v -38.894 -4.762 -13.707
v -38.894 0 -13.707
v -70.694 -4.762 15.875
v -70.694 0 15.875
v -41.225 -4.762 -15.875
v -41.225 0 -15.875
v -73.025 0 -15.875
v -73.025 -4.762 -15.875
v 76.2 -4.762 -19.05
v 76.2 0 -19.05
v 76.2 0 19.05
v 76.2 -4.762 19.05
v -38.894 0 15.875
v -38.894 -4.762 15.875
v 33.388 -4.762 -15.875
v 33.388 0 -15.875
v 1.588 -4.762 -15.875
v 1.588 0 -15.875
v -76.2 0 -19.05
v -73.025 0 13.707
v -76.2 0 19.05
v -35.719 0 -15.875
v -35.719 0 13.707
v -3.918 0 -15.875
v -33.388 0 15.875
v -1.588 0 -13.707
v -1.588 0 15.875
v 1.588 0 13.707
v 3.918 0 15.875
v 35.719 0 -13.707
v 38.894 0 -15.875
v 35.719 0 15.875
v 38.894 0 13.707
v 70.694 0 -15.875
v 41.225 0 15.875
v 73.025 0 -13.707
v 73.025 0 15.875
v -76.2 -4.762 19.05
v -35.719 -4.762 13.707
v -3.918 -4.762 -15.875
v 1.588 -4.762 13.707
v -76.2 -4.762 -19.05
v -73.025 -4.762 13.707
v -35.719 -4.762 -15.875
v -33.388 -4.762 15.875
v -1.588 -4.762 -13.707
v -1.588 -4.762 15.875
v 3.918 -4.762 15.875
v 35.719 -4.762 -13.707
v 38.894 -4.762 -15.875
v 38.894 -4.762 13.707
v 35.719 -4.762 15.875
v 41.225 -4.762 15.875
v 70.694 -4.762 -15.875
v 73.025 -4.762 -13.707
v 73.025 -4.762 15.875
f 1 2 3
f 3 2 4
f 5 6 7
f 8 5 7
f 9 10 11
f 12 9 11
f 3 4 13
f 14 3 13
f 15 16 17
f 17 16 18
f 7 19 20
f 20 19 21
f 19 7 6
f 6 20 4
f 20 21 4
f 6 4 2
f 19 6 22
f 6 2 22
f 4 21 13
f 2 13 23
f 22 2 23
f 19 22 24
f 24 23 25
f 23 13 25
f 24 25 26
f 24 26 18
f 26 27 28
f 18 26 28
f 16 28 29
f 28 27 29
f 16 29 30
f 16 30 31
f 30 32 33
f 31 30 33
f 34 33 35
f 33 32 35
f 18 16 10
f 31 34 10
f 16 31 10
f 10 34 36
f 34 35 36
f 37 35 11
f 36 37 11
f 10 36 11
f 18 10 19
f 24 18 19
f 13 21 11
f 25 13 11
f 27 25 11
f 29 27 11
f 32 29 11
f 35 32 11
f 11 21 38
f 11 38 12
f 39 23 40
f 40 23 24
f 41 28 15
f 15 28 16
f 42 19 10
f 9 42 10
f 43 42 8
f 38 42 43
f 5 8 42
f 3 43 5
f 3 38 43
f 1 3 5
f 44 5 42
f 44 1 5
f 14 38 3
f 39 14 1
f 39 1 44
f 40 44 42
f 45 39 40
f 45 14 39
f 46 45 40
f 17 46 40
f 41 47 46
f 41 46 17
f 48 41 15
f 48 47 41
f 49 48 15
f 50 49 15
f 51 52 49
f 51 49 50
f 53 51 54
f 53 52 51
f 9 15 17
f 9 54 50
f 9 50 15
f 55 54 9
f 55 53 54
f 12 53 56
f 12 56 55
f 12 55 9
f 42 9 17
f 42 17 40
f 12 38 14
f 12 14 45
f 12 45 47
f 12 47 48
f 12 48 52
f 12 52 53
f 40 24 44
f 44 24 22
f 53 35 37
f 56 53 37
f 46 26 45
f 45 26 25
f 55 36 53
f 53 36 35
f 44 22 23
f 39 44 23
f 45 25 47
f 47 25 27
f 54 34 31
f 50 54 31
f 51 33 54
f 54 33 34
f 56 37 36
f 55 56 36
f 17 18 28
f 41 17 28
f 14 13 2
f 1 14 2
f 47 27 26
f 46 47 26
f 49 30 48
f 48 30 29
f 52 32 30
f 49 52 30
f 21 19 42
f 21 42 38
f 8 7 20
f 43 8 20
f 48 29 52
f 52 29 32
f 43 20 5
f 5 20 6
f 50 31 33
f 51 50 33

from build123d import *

# Parameters (mm, degrees)
F0_W     = 152.4
F0_H     = 38.1
F1_DEPTH = 4.7625


with BuildPart() as f1:
    # F0 (on Front) → F1 (new body)
    with BuildSketch(Plane.XZ):
        Rectangle(F0_W, F0_H)
        Polygon((-73.025, -15.875), (-73.025, 13.706837), (-41.224525, -15.875), align=None, mode=Mode.SUBTRACT)
        Polygon((-35.71875, -15.875), (-35.71875, 13.706837), (-3.918275, -15.875), align=None, mode=Mode.SUBTRACT)
        Polygon((1.5875, -15.875), (1.5875, 13.706837), (33.387975, -15.875), align=None, mode=Mode.SUBTRACT)
        Polygon((38.89375, -15.875), (38.89375, 13.706837), (70.694225, -15.875), align=None, mode=Mode.SUBTRACT)
        Polygon((-38.89375, -13.706837), (-70.694225, 15.875), (-38.89375, 15.875), align=None, mode=Mode.SUBTRACT)
        Polygon((-33.387975, 15.875), (-1.5875, 15.875), (-1.5875, -13.706837), align=None, mode=Mode.SUBTRACT)
        Polygon((35.71875, -13.706837), (3.918275, 15.875), (35.71875, 15.875), align=None, mode=Mode.SUBTRACT)
        Polygon((41.224525, 15.875), (73.025, 15.875), (73.025, -13.706837), align=None, mode=Mode.SUBTRACT)
    extrude(amount=F1_DEPTH)


solid = f1.part
